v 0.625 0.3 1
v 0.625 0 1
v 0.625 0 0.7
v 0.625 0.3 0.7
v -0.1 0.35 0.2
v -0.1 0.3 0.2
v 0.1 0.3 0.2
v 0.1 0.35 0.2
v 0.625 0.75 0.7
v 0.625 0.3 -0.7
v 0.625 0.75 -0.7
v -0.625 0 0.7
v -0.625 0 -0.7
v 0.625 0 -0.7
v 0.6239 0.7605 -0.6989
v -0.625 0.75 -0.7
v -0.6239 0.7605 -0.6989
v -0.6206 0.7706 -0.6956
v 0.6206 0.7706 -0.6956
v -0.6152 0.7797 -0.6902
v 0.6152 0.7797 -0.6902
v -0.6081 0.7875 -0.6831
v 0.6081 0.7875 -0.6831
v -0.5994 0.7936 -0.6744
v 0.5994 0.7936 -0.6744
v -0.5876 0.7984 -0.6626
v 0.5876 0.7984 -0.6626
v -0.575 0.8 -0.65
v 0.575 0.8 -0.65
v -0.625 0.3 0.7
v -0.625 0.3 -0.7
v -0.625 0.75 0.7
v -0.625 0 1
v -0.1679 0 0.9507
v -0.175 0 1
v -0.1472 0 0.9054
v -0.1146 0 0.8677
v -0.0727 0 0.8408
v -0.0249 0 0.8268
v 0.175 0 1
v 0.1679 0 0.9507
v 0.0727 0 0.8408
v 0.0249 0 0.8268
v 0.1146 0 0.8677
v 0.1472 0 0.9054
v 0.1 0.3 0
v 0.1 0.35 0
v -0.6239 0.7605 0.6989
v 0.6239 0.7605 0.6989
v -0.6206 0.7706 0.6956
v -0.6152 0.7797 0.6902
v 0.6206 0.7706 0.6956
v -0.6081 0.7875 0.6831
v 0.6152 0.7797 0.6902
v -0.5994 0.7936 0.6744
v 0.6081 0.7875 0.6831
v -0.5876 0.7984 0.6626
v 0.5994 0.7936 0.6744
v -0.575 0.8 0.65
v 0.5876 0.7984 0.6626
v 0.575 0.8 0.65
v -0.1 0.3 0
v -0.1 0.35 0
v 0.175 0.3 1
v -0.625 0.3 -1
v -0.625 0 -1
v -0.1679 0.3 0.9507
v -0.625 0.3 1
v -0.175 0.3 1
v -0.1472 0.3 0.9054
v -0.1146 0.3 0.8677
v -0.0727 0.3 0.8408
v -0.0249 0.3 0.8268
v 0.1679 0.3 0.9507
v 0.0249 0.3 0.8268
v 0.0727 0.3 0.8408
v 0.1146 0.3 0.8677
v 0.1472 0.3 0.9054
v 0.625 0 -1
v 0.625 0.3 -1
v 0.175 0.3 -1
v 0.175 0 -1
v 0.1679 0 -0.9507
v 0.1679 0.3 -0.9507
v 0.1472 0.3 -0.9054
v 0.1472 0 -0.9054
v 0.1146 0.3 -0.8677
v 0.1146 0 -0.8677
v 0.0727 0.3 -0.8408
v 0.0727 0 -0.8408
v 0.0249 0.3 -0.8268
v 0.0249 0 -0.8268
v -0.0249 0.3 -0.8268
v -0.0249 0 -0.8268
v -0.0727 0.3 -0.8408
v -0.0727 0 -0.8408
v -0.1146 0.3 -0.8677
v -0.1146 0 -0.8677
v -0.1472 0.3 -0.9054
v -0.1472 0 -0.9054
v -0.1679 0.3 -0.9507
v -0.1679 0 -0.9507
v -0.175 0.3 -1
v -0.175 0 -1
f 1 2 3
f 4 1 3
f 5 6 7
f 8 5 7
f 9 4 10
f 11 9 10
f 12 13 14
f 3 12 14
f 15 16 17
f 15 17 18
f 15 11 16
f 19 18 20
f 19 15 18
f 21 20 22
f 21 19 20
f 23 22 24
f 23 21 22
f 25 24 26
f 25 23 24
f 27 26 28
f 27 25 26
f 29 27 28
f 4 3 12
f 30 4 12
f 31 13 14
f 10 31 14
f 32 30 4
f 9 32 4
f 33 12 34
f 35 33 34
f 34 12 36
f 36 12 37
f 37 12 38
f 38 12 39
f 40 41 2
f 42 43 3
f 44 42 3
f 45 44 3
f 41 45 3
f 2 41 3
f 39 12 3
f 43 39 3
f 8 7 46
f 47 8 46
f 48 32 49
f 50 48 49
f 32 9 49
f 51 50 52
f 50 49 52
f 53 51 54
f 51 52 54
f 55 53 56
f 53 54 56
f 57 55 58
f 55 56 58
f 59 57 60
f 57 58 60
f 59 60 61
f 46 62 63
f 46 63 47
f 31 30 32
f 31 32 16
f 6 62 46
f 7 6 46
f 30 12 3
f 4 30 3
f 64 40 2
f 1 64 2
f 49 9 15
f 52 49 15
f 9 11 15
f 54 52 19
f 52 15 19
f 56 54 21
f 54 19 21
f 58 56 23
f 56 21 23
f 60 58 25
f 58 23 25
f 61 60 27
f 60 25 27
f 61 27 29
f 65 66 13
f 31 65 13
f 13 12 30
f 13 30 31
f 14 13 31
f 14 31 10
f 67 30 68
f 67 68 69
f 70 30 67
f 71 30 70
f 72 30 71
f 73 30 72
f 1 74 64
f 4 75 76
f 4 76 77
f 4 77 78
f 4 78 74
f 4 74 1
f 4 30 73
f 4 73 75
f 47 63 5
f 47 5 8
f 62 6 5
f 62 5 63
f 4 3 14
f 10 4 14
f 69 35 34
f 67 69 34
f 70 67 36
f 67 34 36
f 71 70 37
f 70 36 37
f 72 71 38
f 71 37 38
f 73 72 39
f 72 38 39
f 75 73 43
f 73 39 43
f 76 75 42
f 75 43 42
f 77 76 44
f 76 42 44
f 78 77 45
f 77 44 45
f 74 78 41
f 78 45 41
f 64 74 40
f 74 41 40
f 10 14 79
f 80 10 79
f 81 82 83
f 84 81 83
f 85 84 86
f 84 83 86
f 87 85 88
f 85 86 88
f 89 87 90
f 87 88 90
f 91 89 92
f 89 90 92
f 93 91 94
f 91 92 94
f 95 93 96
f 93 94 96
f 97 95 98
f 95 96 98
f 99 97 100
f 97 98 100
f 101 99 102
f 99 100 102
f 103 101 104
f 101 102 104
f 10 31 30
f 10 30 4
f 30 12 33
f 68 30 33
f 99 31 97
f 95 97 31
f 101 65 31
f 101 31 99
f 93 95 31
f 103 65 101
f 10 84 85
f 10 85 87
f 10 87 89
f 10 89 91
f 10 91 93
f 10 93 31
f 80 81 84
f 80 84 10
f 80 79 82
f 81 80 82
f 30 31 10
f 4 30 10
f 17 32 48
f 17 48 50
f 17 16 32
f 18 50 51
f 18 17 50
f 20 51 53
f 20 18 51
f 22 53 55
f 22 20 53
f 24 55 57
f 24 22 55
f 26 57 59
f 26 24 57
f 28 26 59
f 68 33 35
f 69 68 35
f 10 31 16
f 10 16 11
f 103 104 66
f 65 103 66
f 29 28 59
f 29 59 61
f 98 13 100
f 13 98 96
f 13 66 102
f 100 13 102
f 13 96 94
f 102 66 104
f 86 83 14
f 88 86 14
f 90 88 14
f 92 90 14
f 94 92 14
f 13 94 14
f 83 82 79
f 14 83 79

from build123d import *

# Parameters (mm, degrees)
SALIENTE_EXTRUIR1_DEPTH   = 0.3
SALIENTE_EXTRUIR1_2_DEPTH = 0.3
CROQUIS1_4_W              = 1.25
CROQUIS1_4_H              = 1.4
SALIENTE_EXTRUIR2_DEPTH   = 0.3
CROQUIS2_W                = 1.25
CROQUIS2_H                = 1.4
SALIENTE_EXTRUIR3_DEPTH   = 0.5
REDONDEO1_R               = 0.05
CROQUIS4_W                = 0.2
CROQUIS4_H                = 0.2
SALIENTE_EXTRUIR7_DEPTH   = 0.05


with BuildPart() as part:
    # Croquis1 → Saliente-Extruir1 (new body)
    with BuildSketch(Plane(origin=(0, 0, 0), x_dir=(1, 0, 0), z_dir=(0, 1, 0))):
        with BuildLine():
            Line((-0.625, 1), (-0.625, 0.7))
            Line((-0.625, 0.7), (0.625, 0.7))
            Line((0.625, 0.7), (0.625, 1))
            Line((0.625, 1), (0.175, 1))
            ThreePointArc((0.175, 1), (0, 0.825), (-0.175, 1))
            Line((-0.175, 1), (-0.625, 1))
        make_face()
    extrude(amount=SALIENTE_EXTRUIR1_DEPTH)


with BuildPart() as body_2:
    # Croquis1 → Saliente-Extruir1 2 (new body)
    with BuildSketch(Plane(origin=(0, 0, 0), x_dir=(1, 0, 0), z_dir=(0, 1, 0))):
        with BuildLine():
            Line((0.625, -0.7), (-0.625, -0.7))
            Line((-0.625, -0.7), (-0.625, -1))
            Line((-0.625, -1), (-0.175, -1))
            ThreePointArc((-0.175, -1), (0, -0.825), (0.175, -1))
            Line((0.175, -1), (0.625, -1))
            Line((0.625, -1), (0.625, -0.7))
        make_face()
    extrude(amount=SALIENTE_EXTRUIR1_2_DEPTH)


with BuildPart() as body_3:
    # Croquis1<4> → Saliente-Extruir2 (new body)
    with BuildSketch(Plane(origin=(0, 0, 0), x_dir=(1, 0, 0), z_dir=(0, 1, 0))):
        Rectangle(CROQUIS1_4_W, CROQUIS1_4_H)
    extrude(amount=SALIENTE_EXTRUIR2_DEPTH)


with BuildPart() as body_4:
    # Croquis2 → Saliente-Extruir3 (new body)
    with BuildSketch(Plane(origin=(0, 0.3, 0), x_dir=(1, 0, 0), z_dir=(0, 1, 0))):
        Rectangle(CROQUIS2_W, CROQUIS2_H)
    extrude(amount=SALIENTE_EXTRUIR3_DEPTH)

    # Redondeo1
    redondeo1_edges = [body_4.edges().sort_by_distance(p)[0] for p in [
        (0, 0.8, -0.7),
        (-0.625, 0.8, 0),
        (0, 0.8, 0.7),
        (0.625, 0.8, 0),
    ]]
    fillet(redondeo1_edges, radius=REDONDEO1_R)


with BuildPart() as body_5:
    # Croquis4 → Saliente-Extruir7 (new body)
    with BuildSketch(Plane(origin=(0, 0.3, 0), x_dir=(1, 0, 0), z_dir=(0, 1, 0))):
        with Locations((0, -0.1)):
            Rectangle(CROQUIS4_W, CROQUIS4_H)
    extrude(amount=SALIENTE_EXTRUIR7_DEPTH)


solid = Compound([part.part, body_2.part, body_3.part, body_4.part, body_5.part])
